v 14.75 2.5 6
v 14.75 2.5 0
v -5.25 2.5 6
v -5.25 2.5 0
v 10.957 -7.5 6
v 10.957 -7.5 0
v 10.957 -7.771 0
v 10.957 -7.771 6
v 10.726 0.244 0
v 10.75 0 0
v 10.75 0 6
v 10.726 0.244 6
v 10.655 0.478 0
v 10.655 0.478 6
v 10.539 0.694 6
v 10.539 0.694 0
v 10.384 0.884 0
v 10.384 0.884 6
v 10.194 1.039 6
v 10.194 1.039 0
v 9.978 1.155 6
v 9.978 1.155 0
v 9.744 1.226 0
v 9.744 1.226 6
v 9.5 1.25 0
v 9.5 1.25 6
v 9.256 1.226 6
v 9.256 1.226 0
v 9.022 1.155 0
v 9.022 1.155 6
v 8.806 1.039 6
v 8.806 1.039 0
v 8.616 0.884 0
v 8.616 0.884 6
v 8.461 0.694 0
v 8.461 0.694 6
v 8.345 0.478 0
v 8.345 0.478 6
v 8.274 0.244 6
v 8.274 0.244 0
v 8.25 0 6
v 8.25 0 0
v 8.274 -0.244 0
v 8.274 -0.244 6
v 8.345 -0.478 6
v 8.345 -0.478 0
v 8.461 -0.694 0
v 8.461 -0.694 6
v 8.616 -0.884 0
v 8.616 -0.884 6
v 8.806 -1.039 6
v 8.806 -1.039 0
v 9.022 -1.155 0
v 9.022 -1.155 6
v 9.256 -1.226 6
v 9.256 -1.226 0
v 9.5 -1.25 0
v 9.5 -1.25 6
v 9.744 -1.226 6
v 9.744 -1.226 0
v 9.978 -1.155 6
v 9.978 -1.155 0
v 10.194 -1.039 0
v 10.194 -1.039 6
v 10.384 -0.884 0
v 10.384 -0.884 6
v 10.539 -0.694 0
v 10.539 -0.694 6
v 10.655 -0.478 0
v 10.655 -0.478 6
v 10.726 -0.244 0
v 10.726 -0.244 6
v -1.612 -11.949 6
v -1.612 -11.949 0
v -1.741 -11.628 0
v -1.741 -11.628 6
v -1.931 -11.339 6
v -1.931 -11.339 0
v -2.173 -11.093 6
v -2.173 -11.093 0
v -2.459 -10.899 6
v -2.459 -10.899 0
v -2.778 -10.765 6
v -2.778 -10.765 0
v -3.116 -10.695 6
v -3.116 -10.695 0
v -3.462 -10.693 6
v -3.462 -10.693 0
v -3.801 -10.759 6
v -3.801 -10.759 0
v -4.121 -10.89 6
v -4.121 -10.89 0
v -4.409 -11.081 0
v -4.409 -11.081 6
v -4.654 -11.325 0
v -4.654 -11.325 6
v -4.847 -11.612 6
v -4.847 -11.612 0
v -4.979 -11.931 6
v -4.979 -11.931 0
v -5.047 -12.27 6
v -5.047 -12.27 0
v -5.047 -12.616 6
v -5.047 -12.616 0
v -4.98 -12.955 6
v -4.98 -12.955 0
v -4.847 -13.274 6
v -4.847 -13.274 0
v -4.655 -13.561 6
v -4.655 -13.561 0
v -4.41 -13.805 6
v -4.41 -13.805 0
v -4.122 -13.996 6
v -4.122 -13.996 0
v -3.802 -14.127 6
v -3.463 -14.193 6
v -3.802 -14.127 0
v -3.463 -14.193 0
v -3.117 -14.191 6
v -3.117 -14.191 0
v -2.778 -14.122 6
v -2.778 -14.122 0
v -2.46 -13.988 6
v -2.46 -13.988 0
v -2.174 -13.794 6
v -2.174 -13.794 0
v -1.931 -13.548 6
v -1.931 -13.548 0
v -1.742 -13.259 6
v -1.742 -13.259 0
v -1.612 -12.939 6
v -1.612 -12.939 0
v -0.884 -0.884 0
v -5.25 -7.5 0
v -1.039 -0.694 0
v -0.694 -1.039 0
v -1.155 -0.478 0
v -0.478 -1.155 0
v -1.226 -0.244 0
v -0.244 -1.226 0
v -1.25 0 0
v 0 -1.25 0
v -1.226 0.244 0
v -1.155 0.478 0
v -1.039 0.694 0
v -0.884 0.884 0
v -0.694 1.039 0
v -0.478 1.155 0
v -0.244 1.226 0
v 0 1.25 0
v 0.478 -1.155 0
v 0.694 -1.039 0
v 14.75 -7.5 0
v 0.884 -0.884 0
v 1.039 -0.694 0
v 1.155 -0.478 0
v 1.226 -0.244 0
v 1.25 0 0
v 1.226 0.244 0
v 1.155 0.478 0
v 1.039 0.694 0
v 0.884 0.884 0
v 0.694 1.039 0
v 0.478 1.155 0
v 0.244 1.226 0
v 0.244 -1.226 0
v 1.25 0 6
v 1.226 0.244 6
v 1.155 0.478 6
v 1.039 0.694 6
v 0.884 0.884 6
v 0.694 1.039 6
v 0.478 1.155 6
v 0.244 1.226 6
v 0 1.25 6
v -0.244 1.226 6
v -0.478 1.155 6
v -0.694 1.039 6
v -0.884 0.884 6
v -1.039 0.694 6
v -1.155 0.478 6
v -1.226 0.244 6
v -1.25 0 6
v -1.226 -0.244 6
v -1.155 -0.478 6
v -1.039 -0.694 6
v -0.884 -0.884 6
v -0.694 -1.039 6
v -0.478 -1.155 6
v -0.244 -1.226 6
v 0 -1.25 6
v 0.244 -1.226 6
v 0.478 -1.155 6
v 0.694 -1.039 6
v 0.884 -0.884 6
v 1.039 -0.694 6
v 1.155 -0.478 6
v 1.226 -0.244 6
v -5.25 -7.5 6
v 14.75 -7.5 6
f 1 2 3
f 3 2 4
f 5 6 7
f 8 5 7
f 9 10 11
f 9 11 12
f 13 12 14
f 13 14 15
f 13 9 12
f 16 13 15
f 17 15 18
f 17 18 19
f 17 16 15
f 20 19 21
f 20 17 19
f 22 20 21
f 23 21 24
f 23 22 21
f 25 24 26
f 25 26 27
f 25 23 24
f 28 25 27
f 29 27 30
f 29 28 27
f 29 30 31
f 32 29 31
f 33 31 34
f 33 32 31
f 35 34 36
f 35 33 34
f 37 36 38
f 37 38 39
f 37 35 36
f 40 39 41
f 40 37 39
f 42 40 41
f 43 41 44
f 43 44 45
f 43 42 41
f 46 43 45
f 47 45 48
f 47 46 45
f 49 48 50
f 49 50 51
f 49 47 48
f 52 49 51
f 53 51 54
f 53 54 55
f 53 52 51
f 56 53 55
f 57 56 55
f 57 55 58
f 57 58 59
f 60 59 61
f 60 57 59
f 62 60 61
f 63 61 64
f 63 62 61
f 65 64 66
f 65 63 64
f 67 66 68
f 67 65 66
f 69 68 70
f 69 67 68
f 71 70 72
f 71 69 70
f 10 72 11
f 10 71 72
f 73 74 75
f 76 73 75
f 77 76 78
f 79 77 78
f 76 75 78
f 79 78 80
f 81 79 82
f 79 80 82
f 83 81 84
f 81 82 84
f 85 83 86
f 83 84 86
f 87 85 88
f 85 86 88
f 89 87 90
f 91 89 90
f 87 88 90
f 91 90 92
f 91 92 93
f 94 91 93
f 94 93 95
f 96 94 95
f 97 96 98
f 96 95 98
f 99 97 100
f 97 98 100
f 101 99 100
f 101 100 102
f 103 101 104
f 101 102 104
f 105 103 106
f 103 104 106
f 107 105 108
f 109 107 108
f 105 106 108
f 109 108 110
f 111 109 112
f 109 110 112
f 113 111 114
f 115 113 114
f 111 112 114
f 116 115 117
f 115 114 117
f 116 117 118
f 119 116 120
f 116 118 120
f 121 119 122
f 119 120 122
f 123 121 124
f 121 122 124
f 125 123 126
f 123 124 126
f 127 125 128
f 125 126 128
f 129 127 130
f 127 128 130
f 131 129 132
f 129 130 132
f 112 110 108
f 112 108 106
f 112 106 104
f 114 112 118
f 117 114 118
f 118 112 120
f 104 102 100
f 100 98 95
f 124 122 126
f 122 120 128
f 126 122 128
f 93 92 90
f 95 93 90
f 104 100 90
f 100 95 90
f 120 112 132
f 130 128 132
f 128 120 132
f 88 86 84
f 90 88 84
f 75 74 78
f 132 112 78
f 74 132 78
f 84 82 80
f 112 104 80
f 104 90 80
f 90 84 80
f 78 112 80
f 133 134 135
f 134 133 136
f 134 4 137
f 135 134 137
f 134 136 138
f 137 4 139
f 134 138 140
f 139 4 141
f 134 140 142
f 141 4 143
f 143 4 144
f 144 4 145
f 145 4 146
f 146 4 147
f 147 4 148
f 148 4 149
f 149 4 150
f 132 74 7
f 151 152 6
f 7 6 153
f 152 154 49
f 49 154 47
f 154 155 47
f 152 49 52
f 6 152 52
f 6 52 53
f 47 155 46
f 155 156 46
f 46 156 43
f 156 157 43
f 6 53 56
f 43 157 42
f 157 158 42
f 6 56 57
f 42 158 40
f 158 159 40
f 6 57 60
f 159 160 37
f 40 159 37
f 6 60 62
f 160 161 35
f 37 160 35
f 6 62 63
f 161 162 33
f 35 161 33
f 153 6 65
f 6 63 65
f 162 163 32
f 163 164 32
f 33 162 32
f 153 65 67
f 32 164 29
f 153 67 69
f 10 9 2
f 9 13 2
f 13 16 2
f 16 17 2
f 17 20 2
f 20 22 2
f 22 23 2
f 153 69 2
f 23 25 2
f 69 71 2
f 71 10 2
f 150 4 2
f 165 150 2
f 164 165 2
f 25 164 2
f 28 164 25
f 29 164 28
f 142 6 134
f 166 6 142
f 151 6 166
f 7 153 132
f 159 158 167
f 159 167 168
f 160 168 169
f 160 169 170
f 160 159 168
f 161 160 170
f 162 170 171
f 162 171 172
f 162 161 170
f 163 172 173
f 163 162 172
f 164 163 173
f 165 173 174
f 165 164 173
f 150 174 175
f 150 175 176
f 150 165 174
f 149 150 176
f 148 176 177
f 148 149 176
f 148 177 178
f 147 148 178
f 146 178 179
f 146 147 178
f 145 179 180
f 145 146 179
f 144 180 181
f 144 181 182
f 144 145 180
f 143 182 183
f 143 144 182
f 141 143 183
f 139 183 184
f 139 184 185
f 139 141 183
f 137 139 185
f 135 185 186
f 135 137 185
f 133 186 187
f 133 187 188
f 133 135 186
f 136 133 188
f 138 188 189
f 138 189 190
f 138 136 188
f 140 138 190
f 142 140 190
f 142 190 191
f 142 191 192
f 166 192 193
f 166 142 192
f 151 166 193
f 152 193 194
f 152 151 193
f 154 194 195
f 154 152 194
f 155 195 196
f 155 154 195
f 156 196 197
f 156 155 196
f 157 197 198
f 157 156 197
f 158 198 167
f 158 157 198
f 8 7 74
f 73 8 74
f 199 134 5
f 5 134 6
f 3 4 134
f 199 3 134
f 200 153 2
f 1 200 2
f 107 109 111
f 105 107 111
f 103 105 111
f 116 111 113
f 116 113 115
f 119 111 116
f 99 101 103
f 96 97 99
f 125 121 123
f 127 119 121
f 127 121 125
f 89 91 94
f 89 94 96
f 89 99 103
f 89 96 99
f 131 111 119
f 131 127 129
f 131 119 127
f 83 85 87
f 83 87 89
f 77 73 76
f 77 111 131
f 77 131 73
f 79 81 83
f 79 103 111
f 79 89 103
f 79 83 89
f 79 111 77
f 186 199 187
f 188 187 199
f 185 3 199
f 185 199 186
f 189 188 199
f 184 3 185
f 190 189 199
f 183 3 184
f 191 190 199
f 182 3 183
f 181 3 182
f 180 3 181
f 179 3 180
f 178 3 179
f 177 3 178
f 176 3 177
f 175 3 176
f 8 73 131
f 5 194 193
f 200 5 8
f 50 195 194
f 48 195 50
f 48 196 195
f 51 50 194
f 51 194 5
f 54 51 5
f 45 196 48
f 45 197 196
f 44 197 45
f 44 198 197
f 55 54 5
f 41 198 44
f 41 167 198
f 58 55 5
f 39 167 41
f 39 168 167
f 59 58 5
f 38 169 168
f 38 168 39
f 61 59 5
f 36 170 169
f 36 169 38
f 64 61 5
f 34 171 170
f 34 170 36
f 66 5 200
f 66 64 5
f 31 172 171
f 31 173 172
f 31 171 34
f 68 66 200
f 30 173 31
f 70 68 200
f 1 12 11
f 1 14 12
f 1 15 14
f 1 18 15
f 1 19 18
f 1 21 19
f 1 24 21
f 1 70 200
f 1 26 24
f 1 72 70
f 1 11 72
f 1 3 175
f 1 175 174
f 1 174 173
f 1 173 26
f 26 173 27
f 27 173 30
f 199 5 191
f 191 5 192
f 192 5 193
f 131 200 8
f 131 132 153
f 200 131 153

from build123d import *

# Parameters (mm, degrees)
ESQUISSE1_R        = 1.25
BOSS_EXTRU_1_DEPTH = 6


with BuildPart() as part:
    # Esquisse1 → Boss.-Extru.1 (new body)
    with BuildSketch(Plane.XY):
        with BuildLine():
            Line((14.75, 2.5), (-5.25, 2.5))
            Line((-5.25, 2.5), (-5.25, -7.5))
            Line((-5.25, -7.5), (10.956846109, -7.5))
            Line((10.956846109, -7.5), (10.956846109, -7.7709826))
            Line((10.956846109, -7.7709826), (-1.611734821, -11.948666512))
            ThreePointArc((-1.611734821, -11.948666512), (-5.055755597, -12.442812593), (-1.611966598, -12.938571387))
            Line((-1.611966598, -12.938571387), (14.75, -7.5))
            Line((14.75, -7.5), (14.75, 2.5))
        make_face()
        Circle(ESQUISSE1_R, mode=Mode.SUBTRACT)
        with Locations((9.5, 0)):
            Circle(ESQUISSE1_R, mode=Mode.SUBTRACT)
    extrude(amount=BOSS_EXTRU_1_DEPTH)


solid = part.part
